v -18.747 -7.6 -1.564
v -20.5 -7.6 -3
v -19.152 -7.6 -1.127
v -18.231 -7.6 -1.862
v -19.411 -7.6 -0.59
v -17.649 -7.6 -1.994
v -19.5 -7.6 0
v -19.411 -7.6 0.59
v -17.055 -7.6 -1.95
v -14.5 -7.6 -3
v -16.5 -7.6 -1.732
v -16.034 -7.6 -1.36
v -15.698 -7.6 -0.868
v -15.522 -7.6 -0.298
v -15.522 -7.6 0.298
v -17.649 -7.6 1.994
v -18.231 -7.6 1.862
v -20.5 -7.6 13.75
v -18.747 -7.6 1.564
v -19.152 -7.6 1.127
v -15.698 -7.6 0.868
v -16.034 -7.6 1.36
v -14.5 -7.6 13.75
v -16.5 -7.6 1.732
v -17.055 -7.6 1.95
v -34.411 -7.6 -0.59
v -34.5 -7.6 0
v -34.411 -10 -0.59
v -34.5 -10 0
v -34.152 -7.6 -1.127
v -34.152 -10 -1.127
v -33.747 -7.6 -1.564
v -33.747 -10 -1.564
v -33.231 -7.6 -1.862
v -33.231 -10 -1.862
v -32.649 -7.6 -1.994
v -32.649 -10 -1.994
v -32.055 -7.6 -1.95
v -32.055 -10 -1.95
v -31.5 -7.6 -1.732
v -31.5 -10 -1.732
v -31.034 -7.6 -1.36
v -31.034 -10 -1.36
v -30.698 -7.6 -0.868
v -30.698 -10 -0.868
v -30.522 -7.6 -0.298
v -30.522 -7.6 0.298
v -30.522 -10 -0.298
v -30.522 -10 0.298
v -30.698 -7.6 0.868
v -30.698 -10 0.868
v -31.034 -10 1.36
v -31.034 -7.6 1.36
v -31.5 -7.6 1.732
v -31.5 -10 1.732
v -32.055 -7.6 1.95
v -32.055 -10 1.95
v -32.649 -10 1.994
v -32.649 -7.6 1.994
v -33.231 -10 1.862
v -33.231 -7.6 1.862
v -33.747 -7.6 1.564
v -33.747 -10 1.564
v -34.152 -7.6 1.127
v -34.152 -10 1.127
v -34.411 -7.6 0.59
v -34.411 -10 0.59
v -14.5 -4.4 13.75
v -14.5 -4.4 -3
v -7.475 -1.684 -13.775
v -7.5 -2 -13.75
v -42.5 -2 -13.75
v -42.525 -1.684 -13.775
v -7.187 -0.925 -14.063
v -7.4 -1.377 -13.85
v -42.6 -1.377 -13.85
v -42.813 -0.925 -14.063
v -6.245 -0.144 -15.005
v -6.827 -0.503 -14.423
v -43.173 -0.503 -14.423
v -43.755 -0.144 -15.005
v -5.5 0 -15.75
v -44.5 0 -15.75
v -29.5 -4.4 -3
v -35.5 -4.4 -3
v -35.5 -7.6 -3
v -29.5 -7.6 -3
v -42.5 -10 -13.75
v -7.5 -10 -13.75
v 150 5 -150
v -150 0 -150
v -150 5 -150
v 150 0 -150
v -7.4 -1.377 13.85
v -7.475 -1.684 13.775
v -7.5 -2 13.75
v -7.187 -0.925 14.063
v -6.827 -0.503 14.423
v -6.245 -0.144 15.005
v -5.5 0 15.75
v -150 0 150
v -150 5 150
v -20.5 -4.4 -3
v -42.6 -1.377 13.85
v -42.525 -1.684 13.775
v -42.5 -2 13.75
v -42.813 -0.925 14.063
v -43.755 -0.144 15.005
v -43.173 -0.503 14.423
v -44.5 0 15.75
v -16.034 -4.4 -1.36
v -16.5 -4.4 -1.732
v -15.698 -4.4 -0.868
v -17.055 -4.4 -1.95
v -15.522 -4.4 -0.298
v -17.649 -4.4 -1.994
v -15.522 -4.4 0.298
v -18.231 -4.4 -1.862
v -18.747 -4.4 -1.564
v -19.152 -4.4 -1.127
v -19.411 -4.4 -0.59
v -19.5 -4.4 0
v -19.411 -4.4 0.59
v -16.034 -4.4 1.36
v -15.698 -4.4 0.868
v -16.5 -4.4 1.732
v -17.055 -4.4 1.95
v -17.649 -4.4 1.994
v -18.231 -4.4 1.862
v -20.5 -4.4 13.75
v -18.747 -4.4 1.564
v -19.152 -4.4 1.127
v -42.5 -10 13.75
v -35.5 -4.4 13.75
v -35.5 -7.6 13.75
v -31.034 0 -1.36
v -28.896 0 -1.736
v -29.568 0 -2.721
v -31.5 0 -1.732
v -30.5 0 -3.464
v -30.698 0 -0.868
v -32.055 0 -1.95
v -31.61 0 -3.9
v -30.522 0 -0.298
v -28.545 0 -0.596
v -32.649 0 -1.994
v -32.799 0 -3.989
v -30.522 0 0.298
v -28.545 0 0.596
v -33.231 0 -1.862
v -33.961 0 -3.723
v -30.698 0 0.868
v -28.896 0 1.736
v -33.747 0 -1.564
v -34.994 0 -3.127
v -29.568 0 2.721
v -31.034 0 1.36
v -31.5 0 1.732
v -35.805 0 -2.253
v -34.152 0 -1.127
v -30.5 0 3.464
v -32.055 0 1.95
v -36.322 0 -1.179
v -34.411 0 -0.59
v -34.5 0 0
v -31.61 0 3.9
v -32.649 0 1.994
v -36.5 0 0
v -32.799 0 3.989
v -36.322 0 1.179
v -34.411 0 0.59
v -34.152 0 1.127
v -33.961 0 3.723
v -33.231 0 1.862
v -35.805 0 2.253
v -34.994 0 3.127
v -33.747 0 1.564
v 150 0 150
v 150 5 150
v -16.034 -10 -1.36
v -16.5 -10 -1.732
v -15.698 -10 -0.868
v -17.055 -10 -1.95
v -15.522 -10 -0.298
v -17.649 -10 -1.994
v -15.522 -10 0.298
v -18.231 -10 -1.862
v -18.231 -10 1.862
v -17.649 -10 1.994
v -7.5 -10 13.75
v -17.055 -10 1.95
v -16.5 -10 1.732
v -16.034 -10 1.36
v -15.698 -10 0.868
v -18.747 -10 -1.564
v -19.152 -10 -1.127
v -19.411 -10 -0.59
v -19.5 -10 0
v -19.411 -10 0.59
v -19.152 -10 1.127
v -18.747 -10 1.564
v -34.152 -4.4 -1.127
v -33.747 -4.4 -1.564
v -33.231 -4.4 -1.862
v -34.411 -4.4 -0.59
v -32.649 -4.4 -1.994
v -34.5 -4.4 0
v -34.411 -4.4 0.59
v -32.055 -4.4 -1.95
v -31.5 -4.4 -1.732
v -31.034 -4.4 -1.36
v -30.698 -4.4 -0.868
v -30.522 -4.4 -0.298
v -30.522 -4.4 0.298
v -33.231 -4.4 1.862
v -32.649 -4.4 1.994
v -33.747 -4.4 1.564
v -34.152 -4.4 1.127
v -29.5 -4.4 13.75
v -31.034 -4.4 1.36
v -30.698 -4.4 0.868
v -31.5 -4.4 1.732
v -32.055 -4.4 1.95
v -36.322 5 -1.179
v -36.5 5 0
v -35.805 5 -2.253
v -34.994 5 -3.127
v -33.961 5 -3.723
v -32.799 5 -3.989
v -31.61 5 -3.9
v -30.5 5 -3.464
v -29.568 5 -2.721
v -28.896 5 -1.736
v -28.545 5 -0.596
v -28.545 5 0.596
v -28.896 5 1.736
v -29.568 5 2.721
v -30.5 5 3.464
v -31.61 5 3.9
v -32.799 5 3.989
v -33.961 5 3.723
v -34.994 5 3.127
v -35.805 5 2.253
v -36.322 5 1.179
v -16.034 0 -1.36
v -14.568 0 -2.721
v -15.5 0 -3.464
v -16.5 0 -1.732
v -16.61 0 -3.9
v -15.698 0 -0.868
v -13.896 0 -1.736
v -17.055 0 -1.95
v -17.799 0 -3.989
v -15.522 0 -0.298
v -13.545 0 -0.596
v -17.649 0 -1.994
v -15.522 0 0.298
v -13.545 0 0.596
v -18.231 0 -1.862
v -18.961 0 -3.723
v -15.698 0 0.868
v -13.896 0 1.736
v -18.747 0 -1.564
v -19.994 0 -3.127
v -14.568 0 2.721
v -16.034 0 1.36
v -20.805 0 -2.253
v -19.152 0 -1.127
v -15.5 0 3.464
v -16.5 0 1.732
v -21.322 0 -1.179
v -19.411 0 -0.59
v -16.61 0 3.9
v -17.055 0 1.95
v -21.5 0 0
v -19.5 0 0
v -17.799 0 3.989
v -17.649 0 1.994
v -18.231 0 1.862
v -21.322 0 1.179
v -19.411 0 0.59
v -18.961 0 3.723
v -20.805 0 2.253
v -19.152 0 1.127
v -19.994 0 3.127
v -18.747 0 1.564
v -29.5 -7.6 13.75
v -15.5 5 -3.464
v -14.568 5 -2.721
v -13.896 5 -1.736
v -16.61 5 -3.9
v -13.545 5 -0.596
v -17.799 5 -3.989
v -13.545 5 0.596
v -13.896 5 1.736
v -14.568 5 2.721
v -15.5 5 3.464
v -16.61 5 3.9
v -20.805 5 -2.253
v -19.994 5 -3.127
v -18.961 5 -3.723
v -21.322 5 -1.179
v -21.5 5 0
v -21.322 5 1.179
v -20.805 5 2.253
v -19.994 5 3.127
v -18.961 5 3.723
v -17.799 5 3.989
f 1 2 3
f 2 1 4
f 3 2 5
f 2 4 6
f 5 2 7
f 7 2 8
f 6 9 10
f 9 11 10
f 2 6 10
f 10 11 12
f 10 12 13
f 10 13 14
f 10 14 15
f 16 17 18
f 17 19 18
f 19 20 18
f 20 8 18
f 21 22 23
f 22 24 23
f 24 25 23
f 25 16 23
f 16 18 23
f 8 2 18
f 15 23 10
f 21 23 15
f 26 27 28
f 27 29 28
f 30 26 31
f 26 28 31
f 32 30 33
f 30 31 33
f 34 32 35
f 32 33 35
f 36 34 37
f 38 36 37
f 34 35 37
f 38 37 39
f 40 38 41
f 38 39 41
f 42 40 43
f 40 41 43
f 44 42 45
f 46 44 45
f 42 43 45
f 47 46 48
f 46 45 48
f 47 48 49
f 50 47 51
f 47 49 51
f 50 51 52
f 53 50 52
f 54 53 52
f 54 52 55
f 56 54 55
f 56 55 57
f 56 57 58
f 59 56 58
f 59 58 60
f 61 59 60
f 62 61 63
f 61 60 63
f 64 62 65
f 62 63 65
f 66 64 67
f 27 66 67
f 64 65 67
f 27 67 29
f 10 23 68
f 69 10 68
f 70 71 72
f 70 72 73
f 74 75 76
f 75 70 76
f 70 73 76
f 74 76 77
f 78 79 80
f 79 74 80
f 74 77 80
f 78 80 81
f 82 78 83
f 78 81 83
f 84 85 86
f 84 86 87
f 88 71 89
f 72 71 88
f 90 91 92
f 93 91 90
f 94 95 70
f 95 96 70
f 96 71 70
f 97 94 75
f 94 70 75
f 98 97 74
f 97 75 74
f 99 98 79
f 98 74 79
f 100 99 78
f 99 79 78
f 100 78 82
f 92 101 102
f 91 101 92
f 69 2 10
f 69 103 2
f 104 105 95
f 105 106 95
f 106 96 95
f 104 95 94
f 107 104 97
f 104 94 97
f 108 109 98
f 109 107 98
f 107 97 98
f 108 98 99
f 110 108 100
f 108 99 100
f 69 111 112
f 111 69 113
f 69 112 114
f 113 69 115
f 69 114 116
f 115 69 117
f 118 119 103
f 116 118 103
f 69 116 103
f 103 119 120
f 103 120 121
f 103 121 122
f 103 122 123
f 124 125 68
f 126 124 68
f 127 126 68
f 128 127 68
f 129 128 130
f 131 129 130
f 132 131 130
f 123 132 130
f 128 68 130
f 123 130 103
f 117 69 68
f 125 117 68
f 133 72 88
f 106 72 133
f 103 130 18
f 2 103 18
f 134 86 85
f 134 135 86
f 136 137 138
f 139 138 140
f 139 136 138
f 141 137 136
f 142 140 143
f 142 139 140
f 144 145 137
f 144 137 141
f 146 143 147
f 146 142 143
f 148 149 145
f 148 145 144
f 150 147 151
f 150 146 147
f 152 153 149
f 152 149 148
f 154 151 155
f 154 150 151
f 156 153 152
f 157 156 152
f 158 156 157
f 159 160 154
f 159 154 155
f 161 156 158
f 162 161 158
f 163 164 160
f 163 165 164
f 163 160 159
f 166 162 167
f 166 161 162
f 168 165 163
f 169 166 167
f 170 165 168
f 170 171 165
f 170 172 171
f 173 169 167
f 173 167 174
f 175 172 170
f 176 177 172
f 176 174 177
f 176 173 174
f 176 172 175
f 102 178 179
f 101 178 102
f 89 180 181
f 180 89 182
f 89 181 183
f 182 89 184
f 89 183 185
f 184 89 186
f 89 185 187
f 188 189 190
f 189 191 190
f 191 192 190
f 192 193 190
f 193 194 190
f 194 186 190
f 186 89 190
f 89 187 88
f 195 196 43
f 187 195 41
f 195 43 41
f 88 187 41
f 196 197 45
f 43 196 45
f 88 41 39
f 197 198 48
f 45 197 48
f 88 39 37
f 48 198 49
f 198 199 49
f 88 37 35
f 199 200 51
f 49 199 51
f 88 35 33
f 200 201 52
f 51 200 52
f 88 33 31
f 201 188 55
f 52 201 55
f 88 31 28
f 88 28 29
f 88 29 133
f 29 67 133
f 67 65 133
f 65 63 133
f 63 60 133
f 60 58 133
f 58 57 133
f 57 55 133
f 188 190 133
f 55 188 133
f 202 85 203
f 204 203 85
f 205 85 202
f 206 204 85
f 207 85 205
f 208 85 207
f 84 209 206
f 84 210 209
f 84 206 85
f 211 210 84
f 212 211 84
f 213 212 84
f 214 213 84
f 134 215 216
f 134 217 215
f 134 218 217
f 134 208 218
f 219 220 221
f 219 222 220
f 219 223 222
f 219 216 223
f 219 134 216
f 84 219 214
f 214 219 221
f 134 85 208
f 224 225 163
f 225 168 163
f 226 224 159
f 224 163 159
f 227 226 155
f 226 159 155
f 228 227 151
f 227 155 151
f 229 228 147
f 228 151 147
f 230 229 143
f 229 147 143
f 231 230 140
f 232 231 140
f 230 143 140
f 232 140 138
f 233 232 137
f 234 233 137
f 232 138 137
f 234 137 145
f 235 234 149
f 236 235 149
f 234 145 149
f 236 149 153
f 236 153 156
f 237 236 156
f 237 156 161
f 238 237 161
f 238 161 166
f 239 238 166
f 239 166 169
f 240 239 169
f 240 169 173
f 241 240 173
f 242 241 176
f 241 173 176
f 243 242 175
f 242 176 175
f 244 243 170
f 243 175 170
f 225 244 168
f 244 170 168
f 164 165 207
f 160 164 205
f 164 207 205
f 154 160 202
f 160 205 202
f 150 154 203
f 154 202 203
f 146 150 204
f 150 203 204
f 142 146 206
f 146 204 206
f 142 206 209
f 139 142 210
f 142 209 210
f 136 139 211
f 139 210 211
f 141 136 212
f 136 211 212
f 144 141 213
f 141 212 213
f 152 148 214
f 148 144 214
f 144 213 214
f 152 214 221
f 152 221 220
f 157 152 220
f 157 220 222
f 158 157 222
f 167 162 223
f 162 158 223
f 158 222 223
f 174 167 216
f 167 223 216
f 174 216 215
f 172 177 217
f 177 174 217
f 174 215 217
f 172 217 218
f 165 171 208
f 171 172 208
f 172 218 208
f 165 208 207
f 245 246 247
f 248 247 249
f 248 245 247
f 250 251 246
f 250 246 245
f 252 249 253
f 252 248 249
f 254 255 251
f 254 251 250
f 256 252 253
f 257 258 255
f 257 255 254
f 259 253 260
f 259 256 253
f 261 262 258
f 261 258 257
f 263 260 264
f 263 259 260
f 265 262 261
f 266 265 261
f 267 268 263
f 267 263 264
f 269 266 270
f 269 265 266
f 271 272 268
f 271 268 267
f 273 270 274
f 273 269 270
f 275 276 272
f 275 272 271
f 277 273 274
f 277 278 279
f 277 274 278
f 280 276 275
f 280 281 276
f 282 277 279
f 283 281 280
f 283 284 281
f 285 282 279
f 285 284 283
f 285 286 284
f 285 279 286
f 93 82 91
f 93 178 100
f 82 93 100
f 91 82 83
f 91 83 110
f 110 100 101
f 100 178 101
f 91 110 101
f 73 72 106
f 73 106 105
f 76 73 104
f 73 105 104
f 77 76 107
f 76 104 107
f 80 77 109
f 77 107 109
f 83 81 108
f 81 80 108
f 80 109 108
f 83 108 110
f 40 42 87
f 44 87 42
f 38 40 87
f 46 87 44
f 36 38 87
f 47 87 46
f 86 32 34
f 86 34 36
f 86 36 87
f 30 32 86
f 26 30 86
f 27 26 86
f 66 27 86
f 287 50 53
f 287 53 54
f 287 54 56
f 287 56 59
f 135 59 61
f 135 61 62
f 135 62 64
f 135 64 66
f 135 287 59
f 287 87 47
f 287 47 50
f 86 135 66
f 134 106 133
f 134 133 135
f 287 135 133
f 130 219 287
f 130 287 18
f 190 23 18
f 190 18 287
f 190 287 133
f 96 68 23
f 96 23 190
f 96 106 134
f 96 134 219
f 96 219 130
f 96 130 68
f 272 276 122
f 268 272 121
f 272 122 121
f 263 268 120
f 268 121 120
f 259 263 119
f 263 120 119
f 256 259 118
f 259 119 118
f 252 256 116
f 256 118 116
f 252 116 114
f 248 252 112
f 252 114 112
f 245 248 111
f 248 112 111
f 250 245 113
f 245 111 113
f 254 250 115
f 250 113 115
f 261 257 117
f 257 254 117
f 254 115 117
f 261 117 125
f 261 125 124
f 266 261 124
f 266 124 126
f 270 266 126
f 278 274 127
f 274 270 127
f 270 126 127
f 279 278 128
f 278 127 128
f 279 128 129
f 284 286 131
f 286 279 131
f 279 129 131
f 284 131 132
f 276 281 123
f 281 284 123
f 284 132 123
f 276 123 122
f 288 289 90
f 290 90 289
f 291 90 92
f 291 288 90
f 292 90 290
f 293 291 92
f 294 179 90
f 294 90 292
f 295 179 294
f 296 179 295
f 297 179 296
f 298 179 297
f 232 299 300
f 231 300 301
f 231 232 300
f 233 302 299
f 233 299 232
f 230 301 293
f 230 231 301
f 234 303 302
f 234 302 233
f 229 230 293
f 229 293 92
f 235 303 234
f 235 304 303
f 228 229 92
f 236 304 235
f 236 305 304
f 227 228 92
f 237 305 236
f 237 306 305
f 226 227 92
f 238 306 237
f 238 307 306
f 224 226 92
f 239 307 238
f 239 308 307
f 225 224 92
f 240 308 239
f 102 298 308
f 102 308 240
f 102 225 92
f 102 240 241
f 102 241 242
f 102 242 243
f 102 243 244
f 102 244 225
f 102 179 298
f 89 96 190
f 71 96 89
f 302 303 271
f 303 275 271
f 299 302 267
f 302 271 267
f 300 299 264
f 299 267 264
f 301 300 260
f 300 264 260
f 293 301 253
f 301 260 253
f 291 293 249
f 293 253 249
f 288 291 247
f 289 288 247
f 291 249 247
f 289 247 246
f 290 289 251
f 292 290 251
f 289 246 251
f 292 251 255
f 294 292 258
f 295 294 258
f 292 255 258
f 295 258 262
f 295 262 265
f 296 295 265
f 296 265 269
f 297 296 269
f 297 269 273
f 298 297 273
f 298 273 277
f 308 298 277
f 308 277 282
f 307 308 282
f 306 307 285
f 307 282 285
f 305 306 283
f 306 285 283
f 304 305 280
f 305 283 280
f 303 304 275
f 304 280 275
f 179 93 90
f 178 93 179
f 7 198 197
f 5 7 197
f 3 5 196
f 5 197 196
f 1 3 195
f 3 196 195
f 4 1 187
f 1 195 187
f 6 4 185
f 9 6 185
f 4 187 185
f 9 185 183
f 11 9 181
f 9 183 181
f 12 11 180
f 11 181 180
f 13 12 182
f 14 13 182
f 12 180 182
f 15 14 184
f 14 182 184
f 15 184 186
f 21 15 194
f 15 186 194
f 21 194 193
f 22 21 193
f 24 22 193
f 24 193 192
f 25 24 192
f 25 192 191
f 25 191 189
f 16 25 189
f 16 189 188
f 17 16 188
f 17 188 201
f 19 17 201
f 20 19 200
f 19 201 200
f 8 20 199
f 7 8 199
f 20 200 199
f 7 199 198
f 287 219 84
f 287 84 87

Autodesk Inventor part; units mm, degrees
ref_plane "YZ Plane" through (0, 0, 0) normal (1, 0, 0) x (0, 1, 0)
ref_plane "XZ Plane" through (0, 0, 0) normal (0, 1, 0) x (-1, 0, 0)
ref_plane "XY Plane" through (0, 0, 0) normal (0, 0, 1) x (1, 0, 0)
sketch "Sketch1" plane through (0, 0, 0) normal (0, 1, 0) x (-1, 0, 0)
  line L0 (-150, 150) -> (150, 150)
  line L1 (150, 150) -> (150, -150)
  line L2 (150, -150) -> (-150, -150)
  line L3 (-150, -150) -> (-150, 150)
  line L4 (-150, 150) -> (150, -150) construction
  line L5 (150, 150) -> (-150, -150) construction
  line L6 (150, 0) -> (-150, 0) construction
  line L7 (0, 150) -> (0, -150) construction
  line L8 (37.5, 6.35) -> (-37.5, 6.35) construction
  line L9 (-37.5, 6.35) -> (-37.5, -6.35) construction
  line L10 (-37.5, -6.35) -> (37.5, -6.35) construction
  line L11 (37.5, -6.35) -> (37.5, 6.35) construction
  line L12 (37.5, 6.35) -> (-37.5, -6.35) construction
  line L13 (-37.5, 6.35) -> (37.5, -6.35) construction
  circle A0 centre (32.5, 0) radius 2
  circle A1 centre (17.5, 0) radius 2
  circle A2 centre (-32.5, 0) radius 2 construction
  circle A3 centre (-17.5, 0) radius 2 construction
  line L14 (30.5, 0) -> (19.5, 0) construction
  line L15 (42.5, 13.75) -> (7.5, 13.75)
  line L16 (7.5, 13.75) -> (7.5, -13.75)
  line L17 (7.5, -13.75) -> (42.5, -13.75)
  line L18 (42.5, -13.75) -> (42.5, 13.75)
  line L19 (42.5, 13.75) -> (7.5, -13.75) construction
  line L20 (7.5, 13.75) -> (42.5, -13.75) construction
  circle A4 centre (32.5, 0) radius 4
  circle A5 centre (17.5, 0) radius 4
  point P0 (0, 0)
  point P1 (37.5, 0)
  point P2 (25, 0)
  dimension "d4" = 4
  dimension "d7" = 4
  dimension "d0" = 300
  dimension "d1" = 300
  dimension "d2" = 75
  dimension "d3" = 12.7
  dimension "d5" = 5
  dimension "d8" = 15
  dimension "d9" = 35
  dimension "d10" = 27.5
  dimension "d15" = 8
  dimension "d16" = 8
extrude "Extrusion1" add sketch "Sketch1" along normal blind 5 contours L0 L1 L2 L3 | L18 L17 L16 L15 | A4 | A5
extrude "Extrusion2" add sketch "Sketch1" against normal blind 10 contours L18 L17 L16 L15 | A4 | A5
extrude "Extrusion3" cut sketch "Sketch1" along normal blind 10 contours A4 | A5
fillet "Fillet1" radius 2 4 edges at (-42.5, 0, 0) (-25, 0, 13.75) (-25, 0, -13.75) (-7.5, 0, 0)
sketch "Sketch2" plane through (-42.5, -10, 13.75) normal (0, 0, 1) x (1, 0, 0)
  line L0 (0, 8) -> (35, 8) projected
  line L1 (0, 8) -> (0, 0) projected
  line L2 (35, 0) -> (0, 0) projected
  line L3 (35, 8) -> (35, 0) projected
  line L4 (10, 8) -> (10, 0) construction
  line L5 (7, 5.6) -> (13, 5.6)
  line L6 (13, 5.6) -> (13, 2.4)
  line L7 (13, 2.4) -> (7, 2.4)
  line L8 (7, 2.4) -> (7, 5.6)
  line L9 (7, 5.6) -> (13, 2.4) construction
  line L10 (13, 5.6) -> (7, 2.4) construction
  line L11 (0, 4) -> (10, 4) construction
  line L12 (35, 0) -> (0, 0) projected
  line L13 (17.5, 0) -> (17.5, 8) construction
  line L14 (28, 5.6) -> (22, 5.6)
  line L15 (22, 5.6) -> (22, 2.4)
  line L16 (22, 2.4) -> (28, 2.4)
  line L17 (28, 2.4) -> (28, 5.6)
  line L18 (28, 5.6) -> (22, 2.4) construction
  line L19 (22, 5.6) -> (28, 2.4) construction
  point P0 (42.5, 10)
  point P1 (25, 4)
  dimension "d20" = 10
  dimension "d21" = 6
  dimension "d22" = 3.2
extrude "Extrusion4" cut sketch "Sketch2" against normal blind 16.75 contours L5 L6 L7 L8 | L17 L16 L15 L14
properties part number "PlataformaLoadCell" material "PC/ABS Plastic"
